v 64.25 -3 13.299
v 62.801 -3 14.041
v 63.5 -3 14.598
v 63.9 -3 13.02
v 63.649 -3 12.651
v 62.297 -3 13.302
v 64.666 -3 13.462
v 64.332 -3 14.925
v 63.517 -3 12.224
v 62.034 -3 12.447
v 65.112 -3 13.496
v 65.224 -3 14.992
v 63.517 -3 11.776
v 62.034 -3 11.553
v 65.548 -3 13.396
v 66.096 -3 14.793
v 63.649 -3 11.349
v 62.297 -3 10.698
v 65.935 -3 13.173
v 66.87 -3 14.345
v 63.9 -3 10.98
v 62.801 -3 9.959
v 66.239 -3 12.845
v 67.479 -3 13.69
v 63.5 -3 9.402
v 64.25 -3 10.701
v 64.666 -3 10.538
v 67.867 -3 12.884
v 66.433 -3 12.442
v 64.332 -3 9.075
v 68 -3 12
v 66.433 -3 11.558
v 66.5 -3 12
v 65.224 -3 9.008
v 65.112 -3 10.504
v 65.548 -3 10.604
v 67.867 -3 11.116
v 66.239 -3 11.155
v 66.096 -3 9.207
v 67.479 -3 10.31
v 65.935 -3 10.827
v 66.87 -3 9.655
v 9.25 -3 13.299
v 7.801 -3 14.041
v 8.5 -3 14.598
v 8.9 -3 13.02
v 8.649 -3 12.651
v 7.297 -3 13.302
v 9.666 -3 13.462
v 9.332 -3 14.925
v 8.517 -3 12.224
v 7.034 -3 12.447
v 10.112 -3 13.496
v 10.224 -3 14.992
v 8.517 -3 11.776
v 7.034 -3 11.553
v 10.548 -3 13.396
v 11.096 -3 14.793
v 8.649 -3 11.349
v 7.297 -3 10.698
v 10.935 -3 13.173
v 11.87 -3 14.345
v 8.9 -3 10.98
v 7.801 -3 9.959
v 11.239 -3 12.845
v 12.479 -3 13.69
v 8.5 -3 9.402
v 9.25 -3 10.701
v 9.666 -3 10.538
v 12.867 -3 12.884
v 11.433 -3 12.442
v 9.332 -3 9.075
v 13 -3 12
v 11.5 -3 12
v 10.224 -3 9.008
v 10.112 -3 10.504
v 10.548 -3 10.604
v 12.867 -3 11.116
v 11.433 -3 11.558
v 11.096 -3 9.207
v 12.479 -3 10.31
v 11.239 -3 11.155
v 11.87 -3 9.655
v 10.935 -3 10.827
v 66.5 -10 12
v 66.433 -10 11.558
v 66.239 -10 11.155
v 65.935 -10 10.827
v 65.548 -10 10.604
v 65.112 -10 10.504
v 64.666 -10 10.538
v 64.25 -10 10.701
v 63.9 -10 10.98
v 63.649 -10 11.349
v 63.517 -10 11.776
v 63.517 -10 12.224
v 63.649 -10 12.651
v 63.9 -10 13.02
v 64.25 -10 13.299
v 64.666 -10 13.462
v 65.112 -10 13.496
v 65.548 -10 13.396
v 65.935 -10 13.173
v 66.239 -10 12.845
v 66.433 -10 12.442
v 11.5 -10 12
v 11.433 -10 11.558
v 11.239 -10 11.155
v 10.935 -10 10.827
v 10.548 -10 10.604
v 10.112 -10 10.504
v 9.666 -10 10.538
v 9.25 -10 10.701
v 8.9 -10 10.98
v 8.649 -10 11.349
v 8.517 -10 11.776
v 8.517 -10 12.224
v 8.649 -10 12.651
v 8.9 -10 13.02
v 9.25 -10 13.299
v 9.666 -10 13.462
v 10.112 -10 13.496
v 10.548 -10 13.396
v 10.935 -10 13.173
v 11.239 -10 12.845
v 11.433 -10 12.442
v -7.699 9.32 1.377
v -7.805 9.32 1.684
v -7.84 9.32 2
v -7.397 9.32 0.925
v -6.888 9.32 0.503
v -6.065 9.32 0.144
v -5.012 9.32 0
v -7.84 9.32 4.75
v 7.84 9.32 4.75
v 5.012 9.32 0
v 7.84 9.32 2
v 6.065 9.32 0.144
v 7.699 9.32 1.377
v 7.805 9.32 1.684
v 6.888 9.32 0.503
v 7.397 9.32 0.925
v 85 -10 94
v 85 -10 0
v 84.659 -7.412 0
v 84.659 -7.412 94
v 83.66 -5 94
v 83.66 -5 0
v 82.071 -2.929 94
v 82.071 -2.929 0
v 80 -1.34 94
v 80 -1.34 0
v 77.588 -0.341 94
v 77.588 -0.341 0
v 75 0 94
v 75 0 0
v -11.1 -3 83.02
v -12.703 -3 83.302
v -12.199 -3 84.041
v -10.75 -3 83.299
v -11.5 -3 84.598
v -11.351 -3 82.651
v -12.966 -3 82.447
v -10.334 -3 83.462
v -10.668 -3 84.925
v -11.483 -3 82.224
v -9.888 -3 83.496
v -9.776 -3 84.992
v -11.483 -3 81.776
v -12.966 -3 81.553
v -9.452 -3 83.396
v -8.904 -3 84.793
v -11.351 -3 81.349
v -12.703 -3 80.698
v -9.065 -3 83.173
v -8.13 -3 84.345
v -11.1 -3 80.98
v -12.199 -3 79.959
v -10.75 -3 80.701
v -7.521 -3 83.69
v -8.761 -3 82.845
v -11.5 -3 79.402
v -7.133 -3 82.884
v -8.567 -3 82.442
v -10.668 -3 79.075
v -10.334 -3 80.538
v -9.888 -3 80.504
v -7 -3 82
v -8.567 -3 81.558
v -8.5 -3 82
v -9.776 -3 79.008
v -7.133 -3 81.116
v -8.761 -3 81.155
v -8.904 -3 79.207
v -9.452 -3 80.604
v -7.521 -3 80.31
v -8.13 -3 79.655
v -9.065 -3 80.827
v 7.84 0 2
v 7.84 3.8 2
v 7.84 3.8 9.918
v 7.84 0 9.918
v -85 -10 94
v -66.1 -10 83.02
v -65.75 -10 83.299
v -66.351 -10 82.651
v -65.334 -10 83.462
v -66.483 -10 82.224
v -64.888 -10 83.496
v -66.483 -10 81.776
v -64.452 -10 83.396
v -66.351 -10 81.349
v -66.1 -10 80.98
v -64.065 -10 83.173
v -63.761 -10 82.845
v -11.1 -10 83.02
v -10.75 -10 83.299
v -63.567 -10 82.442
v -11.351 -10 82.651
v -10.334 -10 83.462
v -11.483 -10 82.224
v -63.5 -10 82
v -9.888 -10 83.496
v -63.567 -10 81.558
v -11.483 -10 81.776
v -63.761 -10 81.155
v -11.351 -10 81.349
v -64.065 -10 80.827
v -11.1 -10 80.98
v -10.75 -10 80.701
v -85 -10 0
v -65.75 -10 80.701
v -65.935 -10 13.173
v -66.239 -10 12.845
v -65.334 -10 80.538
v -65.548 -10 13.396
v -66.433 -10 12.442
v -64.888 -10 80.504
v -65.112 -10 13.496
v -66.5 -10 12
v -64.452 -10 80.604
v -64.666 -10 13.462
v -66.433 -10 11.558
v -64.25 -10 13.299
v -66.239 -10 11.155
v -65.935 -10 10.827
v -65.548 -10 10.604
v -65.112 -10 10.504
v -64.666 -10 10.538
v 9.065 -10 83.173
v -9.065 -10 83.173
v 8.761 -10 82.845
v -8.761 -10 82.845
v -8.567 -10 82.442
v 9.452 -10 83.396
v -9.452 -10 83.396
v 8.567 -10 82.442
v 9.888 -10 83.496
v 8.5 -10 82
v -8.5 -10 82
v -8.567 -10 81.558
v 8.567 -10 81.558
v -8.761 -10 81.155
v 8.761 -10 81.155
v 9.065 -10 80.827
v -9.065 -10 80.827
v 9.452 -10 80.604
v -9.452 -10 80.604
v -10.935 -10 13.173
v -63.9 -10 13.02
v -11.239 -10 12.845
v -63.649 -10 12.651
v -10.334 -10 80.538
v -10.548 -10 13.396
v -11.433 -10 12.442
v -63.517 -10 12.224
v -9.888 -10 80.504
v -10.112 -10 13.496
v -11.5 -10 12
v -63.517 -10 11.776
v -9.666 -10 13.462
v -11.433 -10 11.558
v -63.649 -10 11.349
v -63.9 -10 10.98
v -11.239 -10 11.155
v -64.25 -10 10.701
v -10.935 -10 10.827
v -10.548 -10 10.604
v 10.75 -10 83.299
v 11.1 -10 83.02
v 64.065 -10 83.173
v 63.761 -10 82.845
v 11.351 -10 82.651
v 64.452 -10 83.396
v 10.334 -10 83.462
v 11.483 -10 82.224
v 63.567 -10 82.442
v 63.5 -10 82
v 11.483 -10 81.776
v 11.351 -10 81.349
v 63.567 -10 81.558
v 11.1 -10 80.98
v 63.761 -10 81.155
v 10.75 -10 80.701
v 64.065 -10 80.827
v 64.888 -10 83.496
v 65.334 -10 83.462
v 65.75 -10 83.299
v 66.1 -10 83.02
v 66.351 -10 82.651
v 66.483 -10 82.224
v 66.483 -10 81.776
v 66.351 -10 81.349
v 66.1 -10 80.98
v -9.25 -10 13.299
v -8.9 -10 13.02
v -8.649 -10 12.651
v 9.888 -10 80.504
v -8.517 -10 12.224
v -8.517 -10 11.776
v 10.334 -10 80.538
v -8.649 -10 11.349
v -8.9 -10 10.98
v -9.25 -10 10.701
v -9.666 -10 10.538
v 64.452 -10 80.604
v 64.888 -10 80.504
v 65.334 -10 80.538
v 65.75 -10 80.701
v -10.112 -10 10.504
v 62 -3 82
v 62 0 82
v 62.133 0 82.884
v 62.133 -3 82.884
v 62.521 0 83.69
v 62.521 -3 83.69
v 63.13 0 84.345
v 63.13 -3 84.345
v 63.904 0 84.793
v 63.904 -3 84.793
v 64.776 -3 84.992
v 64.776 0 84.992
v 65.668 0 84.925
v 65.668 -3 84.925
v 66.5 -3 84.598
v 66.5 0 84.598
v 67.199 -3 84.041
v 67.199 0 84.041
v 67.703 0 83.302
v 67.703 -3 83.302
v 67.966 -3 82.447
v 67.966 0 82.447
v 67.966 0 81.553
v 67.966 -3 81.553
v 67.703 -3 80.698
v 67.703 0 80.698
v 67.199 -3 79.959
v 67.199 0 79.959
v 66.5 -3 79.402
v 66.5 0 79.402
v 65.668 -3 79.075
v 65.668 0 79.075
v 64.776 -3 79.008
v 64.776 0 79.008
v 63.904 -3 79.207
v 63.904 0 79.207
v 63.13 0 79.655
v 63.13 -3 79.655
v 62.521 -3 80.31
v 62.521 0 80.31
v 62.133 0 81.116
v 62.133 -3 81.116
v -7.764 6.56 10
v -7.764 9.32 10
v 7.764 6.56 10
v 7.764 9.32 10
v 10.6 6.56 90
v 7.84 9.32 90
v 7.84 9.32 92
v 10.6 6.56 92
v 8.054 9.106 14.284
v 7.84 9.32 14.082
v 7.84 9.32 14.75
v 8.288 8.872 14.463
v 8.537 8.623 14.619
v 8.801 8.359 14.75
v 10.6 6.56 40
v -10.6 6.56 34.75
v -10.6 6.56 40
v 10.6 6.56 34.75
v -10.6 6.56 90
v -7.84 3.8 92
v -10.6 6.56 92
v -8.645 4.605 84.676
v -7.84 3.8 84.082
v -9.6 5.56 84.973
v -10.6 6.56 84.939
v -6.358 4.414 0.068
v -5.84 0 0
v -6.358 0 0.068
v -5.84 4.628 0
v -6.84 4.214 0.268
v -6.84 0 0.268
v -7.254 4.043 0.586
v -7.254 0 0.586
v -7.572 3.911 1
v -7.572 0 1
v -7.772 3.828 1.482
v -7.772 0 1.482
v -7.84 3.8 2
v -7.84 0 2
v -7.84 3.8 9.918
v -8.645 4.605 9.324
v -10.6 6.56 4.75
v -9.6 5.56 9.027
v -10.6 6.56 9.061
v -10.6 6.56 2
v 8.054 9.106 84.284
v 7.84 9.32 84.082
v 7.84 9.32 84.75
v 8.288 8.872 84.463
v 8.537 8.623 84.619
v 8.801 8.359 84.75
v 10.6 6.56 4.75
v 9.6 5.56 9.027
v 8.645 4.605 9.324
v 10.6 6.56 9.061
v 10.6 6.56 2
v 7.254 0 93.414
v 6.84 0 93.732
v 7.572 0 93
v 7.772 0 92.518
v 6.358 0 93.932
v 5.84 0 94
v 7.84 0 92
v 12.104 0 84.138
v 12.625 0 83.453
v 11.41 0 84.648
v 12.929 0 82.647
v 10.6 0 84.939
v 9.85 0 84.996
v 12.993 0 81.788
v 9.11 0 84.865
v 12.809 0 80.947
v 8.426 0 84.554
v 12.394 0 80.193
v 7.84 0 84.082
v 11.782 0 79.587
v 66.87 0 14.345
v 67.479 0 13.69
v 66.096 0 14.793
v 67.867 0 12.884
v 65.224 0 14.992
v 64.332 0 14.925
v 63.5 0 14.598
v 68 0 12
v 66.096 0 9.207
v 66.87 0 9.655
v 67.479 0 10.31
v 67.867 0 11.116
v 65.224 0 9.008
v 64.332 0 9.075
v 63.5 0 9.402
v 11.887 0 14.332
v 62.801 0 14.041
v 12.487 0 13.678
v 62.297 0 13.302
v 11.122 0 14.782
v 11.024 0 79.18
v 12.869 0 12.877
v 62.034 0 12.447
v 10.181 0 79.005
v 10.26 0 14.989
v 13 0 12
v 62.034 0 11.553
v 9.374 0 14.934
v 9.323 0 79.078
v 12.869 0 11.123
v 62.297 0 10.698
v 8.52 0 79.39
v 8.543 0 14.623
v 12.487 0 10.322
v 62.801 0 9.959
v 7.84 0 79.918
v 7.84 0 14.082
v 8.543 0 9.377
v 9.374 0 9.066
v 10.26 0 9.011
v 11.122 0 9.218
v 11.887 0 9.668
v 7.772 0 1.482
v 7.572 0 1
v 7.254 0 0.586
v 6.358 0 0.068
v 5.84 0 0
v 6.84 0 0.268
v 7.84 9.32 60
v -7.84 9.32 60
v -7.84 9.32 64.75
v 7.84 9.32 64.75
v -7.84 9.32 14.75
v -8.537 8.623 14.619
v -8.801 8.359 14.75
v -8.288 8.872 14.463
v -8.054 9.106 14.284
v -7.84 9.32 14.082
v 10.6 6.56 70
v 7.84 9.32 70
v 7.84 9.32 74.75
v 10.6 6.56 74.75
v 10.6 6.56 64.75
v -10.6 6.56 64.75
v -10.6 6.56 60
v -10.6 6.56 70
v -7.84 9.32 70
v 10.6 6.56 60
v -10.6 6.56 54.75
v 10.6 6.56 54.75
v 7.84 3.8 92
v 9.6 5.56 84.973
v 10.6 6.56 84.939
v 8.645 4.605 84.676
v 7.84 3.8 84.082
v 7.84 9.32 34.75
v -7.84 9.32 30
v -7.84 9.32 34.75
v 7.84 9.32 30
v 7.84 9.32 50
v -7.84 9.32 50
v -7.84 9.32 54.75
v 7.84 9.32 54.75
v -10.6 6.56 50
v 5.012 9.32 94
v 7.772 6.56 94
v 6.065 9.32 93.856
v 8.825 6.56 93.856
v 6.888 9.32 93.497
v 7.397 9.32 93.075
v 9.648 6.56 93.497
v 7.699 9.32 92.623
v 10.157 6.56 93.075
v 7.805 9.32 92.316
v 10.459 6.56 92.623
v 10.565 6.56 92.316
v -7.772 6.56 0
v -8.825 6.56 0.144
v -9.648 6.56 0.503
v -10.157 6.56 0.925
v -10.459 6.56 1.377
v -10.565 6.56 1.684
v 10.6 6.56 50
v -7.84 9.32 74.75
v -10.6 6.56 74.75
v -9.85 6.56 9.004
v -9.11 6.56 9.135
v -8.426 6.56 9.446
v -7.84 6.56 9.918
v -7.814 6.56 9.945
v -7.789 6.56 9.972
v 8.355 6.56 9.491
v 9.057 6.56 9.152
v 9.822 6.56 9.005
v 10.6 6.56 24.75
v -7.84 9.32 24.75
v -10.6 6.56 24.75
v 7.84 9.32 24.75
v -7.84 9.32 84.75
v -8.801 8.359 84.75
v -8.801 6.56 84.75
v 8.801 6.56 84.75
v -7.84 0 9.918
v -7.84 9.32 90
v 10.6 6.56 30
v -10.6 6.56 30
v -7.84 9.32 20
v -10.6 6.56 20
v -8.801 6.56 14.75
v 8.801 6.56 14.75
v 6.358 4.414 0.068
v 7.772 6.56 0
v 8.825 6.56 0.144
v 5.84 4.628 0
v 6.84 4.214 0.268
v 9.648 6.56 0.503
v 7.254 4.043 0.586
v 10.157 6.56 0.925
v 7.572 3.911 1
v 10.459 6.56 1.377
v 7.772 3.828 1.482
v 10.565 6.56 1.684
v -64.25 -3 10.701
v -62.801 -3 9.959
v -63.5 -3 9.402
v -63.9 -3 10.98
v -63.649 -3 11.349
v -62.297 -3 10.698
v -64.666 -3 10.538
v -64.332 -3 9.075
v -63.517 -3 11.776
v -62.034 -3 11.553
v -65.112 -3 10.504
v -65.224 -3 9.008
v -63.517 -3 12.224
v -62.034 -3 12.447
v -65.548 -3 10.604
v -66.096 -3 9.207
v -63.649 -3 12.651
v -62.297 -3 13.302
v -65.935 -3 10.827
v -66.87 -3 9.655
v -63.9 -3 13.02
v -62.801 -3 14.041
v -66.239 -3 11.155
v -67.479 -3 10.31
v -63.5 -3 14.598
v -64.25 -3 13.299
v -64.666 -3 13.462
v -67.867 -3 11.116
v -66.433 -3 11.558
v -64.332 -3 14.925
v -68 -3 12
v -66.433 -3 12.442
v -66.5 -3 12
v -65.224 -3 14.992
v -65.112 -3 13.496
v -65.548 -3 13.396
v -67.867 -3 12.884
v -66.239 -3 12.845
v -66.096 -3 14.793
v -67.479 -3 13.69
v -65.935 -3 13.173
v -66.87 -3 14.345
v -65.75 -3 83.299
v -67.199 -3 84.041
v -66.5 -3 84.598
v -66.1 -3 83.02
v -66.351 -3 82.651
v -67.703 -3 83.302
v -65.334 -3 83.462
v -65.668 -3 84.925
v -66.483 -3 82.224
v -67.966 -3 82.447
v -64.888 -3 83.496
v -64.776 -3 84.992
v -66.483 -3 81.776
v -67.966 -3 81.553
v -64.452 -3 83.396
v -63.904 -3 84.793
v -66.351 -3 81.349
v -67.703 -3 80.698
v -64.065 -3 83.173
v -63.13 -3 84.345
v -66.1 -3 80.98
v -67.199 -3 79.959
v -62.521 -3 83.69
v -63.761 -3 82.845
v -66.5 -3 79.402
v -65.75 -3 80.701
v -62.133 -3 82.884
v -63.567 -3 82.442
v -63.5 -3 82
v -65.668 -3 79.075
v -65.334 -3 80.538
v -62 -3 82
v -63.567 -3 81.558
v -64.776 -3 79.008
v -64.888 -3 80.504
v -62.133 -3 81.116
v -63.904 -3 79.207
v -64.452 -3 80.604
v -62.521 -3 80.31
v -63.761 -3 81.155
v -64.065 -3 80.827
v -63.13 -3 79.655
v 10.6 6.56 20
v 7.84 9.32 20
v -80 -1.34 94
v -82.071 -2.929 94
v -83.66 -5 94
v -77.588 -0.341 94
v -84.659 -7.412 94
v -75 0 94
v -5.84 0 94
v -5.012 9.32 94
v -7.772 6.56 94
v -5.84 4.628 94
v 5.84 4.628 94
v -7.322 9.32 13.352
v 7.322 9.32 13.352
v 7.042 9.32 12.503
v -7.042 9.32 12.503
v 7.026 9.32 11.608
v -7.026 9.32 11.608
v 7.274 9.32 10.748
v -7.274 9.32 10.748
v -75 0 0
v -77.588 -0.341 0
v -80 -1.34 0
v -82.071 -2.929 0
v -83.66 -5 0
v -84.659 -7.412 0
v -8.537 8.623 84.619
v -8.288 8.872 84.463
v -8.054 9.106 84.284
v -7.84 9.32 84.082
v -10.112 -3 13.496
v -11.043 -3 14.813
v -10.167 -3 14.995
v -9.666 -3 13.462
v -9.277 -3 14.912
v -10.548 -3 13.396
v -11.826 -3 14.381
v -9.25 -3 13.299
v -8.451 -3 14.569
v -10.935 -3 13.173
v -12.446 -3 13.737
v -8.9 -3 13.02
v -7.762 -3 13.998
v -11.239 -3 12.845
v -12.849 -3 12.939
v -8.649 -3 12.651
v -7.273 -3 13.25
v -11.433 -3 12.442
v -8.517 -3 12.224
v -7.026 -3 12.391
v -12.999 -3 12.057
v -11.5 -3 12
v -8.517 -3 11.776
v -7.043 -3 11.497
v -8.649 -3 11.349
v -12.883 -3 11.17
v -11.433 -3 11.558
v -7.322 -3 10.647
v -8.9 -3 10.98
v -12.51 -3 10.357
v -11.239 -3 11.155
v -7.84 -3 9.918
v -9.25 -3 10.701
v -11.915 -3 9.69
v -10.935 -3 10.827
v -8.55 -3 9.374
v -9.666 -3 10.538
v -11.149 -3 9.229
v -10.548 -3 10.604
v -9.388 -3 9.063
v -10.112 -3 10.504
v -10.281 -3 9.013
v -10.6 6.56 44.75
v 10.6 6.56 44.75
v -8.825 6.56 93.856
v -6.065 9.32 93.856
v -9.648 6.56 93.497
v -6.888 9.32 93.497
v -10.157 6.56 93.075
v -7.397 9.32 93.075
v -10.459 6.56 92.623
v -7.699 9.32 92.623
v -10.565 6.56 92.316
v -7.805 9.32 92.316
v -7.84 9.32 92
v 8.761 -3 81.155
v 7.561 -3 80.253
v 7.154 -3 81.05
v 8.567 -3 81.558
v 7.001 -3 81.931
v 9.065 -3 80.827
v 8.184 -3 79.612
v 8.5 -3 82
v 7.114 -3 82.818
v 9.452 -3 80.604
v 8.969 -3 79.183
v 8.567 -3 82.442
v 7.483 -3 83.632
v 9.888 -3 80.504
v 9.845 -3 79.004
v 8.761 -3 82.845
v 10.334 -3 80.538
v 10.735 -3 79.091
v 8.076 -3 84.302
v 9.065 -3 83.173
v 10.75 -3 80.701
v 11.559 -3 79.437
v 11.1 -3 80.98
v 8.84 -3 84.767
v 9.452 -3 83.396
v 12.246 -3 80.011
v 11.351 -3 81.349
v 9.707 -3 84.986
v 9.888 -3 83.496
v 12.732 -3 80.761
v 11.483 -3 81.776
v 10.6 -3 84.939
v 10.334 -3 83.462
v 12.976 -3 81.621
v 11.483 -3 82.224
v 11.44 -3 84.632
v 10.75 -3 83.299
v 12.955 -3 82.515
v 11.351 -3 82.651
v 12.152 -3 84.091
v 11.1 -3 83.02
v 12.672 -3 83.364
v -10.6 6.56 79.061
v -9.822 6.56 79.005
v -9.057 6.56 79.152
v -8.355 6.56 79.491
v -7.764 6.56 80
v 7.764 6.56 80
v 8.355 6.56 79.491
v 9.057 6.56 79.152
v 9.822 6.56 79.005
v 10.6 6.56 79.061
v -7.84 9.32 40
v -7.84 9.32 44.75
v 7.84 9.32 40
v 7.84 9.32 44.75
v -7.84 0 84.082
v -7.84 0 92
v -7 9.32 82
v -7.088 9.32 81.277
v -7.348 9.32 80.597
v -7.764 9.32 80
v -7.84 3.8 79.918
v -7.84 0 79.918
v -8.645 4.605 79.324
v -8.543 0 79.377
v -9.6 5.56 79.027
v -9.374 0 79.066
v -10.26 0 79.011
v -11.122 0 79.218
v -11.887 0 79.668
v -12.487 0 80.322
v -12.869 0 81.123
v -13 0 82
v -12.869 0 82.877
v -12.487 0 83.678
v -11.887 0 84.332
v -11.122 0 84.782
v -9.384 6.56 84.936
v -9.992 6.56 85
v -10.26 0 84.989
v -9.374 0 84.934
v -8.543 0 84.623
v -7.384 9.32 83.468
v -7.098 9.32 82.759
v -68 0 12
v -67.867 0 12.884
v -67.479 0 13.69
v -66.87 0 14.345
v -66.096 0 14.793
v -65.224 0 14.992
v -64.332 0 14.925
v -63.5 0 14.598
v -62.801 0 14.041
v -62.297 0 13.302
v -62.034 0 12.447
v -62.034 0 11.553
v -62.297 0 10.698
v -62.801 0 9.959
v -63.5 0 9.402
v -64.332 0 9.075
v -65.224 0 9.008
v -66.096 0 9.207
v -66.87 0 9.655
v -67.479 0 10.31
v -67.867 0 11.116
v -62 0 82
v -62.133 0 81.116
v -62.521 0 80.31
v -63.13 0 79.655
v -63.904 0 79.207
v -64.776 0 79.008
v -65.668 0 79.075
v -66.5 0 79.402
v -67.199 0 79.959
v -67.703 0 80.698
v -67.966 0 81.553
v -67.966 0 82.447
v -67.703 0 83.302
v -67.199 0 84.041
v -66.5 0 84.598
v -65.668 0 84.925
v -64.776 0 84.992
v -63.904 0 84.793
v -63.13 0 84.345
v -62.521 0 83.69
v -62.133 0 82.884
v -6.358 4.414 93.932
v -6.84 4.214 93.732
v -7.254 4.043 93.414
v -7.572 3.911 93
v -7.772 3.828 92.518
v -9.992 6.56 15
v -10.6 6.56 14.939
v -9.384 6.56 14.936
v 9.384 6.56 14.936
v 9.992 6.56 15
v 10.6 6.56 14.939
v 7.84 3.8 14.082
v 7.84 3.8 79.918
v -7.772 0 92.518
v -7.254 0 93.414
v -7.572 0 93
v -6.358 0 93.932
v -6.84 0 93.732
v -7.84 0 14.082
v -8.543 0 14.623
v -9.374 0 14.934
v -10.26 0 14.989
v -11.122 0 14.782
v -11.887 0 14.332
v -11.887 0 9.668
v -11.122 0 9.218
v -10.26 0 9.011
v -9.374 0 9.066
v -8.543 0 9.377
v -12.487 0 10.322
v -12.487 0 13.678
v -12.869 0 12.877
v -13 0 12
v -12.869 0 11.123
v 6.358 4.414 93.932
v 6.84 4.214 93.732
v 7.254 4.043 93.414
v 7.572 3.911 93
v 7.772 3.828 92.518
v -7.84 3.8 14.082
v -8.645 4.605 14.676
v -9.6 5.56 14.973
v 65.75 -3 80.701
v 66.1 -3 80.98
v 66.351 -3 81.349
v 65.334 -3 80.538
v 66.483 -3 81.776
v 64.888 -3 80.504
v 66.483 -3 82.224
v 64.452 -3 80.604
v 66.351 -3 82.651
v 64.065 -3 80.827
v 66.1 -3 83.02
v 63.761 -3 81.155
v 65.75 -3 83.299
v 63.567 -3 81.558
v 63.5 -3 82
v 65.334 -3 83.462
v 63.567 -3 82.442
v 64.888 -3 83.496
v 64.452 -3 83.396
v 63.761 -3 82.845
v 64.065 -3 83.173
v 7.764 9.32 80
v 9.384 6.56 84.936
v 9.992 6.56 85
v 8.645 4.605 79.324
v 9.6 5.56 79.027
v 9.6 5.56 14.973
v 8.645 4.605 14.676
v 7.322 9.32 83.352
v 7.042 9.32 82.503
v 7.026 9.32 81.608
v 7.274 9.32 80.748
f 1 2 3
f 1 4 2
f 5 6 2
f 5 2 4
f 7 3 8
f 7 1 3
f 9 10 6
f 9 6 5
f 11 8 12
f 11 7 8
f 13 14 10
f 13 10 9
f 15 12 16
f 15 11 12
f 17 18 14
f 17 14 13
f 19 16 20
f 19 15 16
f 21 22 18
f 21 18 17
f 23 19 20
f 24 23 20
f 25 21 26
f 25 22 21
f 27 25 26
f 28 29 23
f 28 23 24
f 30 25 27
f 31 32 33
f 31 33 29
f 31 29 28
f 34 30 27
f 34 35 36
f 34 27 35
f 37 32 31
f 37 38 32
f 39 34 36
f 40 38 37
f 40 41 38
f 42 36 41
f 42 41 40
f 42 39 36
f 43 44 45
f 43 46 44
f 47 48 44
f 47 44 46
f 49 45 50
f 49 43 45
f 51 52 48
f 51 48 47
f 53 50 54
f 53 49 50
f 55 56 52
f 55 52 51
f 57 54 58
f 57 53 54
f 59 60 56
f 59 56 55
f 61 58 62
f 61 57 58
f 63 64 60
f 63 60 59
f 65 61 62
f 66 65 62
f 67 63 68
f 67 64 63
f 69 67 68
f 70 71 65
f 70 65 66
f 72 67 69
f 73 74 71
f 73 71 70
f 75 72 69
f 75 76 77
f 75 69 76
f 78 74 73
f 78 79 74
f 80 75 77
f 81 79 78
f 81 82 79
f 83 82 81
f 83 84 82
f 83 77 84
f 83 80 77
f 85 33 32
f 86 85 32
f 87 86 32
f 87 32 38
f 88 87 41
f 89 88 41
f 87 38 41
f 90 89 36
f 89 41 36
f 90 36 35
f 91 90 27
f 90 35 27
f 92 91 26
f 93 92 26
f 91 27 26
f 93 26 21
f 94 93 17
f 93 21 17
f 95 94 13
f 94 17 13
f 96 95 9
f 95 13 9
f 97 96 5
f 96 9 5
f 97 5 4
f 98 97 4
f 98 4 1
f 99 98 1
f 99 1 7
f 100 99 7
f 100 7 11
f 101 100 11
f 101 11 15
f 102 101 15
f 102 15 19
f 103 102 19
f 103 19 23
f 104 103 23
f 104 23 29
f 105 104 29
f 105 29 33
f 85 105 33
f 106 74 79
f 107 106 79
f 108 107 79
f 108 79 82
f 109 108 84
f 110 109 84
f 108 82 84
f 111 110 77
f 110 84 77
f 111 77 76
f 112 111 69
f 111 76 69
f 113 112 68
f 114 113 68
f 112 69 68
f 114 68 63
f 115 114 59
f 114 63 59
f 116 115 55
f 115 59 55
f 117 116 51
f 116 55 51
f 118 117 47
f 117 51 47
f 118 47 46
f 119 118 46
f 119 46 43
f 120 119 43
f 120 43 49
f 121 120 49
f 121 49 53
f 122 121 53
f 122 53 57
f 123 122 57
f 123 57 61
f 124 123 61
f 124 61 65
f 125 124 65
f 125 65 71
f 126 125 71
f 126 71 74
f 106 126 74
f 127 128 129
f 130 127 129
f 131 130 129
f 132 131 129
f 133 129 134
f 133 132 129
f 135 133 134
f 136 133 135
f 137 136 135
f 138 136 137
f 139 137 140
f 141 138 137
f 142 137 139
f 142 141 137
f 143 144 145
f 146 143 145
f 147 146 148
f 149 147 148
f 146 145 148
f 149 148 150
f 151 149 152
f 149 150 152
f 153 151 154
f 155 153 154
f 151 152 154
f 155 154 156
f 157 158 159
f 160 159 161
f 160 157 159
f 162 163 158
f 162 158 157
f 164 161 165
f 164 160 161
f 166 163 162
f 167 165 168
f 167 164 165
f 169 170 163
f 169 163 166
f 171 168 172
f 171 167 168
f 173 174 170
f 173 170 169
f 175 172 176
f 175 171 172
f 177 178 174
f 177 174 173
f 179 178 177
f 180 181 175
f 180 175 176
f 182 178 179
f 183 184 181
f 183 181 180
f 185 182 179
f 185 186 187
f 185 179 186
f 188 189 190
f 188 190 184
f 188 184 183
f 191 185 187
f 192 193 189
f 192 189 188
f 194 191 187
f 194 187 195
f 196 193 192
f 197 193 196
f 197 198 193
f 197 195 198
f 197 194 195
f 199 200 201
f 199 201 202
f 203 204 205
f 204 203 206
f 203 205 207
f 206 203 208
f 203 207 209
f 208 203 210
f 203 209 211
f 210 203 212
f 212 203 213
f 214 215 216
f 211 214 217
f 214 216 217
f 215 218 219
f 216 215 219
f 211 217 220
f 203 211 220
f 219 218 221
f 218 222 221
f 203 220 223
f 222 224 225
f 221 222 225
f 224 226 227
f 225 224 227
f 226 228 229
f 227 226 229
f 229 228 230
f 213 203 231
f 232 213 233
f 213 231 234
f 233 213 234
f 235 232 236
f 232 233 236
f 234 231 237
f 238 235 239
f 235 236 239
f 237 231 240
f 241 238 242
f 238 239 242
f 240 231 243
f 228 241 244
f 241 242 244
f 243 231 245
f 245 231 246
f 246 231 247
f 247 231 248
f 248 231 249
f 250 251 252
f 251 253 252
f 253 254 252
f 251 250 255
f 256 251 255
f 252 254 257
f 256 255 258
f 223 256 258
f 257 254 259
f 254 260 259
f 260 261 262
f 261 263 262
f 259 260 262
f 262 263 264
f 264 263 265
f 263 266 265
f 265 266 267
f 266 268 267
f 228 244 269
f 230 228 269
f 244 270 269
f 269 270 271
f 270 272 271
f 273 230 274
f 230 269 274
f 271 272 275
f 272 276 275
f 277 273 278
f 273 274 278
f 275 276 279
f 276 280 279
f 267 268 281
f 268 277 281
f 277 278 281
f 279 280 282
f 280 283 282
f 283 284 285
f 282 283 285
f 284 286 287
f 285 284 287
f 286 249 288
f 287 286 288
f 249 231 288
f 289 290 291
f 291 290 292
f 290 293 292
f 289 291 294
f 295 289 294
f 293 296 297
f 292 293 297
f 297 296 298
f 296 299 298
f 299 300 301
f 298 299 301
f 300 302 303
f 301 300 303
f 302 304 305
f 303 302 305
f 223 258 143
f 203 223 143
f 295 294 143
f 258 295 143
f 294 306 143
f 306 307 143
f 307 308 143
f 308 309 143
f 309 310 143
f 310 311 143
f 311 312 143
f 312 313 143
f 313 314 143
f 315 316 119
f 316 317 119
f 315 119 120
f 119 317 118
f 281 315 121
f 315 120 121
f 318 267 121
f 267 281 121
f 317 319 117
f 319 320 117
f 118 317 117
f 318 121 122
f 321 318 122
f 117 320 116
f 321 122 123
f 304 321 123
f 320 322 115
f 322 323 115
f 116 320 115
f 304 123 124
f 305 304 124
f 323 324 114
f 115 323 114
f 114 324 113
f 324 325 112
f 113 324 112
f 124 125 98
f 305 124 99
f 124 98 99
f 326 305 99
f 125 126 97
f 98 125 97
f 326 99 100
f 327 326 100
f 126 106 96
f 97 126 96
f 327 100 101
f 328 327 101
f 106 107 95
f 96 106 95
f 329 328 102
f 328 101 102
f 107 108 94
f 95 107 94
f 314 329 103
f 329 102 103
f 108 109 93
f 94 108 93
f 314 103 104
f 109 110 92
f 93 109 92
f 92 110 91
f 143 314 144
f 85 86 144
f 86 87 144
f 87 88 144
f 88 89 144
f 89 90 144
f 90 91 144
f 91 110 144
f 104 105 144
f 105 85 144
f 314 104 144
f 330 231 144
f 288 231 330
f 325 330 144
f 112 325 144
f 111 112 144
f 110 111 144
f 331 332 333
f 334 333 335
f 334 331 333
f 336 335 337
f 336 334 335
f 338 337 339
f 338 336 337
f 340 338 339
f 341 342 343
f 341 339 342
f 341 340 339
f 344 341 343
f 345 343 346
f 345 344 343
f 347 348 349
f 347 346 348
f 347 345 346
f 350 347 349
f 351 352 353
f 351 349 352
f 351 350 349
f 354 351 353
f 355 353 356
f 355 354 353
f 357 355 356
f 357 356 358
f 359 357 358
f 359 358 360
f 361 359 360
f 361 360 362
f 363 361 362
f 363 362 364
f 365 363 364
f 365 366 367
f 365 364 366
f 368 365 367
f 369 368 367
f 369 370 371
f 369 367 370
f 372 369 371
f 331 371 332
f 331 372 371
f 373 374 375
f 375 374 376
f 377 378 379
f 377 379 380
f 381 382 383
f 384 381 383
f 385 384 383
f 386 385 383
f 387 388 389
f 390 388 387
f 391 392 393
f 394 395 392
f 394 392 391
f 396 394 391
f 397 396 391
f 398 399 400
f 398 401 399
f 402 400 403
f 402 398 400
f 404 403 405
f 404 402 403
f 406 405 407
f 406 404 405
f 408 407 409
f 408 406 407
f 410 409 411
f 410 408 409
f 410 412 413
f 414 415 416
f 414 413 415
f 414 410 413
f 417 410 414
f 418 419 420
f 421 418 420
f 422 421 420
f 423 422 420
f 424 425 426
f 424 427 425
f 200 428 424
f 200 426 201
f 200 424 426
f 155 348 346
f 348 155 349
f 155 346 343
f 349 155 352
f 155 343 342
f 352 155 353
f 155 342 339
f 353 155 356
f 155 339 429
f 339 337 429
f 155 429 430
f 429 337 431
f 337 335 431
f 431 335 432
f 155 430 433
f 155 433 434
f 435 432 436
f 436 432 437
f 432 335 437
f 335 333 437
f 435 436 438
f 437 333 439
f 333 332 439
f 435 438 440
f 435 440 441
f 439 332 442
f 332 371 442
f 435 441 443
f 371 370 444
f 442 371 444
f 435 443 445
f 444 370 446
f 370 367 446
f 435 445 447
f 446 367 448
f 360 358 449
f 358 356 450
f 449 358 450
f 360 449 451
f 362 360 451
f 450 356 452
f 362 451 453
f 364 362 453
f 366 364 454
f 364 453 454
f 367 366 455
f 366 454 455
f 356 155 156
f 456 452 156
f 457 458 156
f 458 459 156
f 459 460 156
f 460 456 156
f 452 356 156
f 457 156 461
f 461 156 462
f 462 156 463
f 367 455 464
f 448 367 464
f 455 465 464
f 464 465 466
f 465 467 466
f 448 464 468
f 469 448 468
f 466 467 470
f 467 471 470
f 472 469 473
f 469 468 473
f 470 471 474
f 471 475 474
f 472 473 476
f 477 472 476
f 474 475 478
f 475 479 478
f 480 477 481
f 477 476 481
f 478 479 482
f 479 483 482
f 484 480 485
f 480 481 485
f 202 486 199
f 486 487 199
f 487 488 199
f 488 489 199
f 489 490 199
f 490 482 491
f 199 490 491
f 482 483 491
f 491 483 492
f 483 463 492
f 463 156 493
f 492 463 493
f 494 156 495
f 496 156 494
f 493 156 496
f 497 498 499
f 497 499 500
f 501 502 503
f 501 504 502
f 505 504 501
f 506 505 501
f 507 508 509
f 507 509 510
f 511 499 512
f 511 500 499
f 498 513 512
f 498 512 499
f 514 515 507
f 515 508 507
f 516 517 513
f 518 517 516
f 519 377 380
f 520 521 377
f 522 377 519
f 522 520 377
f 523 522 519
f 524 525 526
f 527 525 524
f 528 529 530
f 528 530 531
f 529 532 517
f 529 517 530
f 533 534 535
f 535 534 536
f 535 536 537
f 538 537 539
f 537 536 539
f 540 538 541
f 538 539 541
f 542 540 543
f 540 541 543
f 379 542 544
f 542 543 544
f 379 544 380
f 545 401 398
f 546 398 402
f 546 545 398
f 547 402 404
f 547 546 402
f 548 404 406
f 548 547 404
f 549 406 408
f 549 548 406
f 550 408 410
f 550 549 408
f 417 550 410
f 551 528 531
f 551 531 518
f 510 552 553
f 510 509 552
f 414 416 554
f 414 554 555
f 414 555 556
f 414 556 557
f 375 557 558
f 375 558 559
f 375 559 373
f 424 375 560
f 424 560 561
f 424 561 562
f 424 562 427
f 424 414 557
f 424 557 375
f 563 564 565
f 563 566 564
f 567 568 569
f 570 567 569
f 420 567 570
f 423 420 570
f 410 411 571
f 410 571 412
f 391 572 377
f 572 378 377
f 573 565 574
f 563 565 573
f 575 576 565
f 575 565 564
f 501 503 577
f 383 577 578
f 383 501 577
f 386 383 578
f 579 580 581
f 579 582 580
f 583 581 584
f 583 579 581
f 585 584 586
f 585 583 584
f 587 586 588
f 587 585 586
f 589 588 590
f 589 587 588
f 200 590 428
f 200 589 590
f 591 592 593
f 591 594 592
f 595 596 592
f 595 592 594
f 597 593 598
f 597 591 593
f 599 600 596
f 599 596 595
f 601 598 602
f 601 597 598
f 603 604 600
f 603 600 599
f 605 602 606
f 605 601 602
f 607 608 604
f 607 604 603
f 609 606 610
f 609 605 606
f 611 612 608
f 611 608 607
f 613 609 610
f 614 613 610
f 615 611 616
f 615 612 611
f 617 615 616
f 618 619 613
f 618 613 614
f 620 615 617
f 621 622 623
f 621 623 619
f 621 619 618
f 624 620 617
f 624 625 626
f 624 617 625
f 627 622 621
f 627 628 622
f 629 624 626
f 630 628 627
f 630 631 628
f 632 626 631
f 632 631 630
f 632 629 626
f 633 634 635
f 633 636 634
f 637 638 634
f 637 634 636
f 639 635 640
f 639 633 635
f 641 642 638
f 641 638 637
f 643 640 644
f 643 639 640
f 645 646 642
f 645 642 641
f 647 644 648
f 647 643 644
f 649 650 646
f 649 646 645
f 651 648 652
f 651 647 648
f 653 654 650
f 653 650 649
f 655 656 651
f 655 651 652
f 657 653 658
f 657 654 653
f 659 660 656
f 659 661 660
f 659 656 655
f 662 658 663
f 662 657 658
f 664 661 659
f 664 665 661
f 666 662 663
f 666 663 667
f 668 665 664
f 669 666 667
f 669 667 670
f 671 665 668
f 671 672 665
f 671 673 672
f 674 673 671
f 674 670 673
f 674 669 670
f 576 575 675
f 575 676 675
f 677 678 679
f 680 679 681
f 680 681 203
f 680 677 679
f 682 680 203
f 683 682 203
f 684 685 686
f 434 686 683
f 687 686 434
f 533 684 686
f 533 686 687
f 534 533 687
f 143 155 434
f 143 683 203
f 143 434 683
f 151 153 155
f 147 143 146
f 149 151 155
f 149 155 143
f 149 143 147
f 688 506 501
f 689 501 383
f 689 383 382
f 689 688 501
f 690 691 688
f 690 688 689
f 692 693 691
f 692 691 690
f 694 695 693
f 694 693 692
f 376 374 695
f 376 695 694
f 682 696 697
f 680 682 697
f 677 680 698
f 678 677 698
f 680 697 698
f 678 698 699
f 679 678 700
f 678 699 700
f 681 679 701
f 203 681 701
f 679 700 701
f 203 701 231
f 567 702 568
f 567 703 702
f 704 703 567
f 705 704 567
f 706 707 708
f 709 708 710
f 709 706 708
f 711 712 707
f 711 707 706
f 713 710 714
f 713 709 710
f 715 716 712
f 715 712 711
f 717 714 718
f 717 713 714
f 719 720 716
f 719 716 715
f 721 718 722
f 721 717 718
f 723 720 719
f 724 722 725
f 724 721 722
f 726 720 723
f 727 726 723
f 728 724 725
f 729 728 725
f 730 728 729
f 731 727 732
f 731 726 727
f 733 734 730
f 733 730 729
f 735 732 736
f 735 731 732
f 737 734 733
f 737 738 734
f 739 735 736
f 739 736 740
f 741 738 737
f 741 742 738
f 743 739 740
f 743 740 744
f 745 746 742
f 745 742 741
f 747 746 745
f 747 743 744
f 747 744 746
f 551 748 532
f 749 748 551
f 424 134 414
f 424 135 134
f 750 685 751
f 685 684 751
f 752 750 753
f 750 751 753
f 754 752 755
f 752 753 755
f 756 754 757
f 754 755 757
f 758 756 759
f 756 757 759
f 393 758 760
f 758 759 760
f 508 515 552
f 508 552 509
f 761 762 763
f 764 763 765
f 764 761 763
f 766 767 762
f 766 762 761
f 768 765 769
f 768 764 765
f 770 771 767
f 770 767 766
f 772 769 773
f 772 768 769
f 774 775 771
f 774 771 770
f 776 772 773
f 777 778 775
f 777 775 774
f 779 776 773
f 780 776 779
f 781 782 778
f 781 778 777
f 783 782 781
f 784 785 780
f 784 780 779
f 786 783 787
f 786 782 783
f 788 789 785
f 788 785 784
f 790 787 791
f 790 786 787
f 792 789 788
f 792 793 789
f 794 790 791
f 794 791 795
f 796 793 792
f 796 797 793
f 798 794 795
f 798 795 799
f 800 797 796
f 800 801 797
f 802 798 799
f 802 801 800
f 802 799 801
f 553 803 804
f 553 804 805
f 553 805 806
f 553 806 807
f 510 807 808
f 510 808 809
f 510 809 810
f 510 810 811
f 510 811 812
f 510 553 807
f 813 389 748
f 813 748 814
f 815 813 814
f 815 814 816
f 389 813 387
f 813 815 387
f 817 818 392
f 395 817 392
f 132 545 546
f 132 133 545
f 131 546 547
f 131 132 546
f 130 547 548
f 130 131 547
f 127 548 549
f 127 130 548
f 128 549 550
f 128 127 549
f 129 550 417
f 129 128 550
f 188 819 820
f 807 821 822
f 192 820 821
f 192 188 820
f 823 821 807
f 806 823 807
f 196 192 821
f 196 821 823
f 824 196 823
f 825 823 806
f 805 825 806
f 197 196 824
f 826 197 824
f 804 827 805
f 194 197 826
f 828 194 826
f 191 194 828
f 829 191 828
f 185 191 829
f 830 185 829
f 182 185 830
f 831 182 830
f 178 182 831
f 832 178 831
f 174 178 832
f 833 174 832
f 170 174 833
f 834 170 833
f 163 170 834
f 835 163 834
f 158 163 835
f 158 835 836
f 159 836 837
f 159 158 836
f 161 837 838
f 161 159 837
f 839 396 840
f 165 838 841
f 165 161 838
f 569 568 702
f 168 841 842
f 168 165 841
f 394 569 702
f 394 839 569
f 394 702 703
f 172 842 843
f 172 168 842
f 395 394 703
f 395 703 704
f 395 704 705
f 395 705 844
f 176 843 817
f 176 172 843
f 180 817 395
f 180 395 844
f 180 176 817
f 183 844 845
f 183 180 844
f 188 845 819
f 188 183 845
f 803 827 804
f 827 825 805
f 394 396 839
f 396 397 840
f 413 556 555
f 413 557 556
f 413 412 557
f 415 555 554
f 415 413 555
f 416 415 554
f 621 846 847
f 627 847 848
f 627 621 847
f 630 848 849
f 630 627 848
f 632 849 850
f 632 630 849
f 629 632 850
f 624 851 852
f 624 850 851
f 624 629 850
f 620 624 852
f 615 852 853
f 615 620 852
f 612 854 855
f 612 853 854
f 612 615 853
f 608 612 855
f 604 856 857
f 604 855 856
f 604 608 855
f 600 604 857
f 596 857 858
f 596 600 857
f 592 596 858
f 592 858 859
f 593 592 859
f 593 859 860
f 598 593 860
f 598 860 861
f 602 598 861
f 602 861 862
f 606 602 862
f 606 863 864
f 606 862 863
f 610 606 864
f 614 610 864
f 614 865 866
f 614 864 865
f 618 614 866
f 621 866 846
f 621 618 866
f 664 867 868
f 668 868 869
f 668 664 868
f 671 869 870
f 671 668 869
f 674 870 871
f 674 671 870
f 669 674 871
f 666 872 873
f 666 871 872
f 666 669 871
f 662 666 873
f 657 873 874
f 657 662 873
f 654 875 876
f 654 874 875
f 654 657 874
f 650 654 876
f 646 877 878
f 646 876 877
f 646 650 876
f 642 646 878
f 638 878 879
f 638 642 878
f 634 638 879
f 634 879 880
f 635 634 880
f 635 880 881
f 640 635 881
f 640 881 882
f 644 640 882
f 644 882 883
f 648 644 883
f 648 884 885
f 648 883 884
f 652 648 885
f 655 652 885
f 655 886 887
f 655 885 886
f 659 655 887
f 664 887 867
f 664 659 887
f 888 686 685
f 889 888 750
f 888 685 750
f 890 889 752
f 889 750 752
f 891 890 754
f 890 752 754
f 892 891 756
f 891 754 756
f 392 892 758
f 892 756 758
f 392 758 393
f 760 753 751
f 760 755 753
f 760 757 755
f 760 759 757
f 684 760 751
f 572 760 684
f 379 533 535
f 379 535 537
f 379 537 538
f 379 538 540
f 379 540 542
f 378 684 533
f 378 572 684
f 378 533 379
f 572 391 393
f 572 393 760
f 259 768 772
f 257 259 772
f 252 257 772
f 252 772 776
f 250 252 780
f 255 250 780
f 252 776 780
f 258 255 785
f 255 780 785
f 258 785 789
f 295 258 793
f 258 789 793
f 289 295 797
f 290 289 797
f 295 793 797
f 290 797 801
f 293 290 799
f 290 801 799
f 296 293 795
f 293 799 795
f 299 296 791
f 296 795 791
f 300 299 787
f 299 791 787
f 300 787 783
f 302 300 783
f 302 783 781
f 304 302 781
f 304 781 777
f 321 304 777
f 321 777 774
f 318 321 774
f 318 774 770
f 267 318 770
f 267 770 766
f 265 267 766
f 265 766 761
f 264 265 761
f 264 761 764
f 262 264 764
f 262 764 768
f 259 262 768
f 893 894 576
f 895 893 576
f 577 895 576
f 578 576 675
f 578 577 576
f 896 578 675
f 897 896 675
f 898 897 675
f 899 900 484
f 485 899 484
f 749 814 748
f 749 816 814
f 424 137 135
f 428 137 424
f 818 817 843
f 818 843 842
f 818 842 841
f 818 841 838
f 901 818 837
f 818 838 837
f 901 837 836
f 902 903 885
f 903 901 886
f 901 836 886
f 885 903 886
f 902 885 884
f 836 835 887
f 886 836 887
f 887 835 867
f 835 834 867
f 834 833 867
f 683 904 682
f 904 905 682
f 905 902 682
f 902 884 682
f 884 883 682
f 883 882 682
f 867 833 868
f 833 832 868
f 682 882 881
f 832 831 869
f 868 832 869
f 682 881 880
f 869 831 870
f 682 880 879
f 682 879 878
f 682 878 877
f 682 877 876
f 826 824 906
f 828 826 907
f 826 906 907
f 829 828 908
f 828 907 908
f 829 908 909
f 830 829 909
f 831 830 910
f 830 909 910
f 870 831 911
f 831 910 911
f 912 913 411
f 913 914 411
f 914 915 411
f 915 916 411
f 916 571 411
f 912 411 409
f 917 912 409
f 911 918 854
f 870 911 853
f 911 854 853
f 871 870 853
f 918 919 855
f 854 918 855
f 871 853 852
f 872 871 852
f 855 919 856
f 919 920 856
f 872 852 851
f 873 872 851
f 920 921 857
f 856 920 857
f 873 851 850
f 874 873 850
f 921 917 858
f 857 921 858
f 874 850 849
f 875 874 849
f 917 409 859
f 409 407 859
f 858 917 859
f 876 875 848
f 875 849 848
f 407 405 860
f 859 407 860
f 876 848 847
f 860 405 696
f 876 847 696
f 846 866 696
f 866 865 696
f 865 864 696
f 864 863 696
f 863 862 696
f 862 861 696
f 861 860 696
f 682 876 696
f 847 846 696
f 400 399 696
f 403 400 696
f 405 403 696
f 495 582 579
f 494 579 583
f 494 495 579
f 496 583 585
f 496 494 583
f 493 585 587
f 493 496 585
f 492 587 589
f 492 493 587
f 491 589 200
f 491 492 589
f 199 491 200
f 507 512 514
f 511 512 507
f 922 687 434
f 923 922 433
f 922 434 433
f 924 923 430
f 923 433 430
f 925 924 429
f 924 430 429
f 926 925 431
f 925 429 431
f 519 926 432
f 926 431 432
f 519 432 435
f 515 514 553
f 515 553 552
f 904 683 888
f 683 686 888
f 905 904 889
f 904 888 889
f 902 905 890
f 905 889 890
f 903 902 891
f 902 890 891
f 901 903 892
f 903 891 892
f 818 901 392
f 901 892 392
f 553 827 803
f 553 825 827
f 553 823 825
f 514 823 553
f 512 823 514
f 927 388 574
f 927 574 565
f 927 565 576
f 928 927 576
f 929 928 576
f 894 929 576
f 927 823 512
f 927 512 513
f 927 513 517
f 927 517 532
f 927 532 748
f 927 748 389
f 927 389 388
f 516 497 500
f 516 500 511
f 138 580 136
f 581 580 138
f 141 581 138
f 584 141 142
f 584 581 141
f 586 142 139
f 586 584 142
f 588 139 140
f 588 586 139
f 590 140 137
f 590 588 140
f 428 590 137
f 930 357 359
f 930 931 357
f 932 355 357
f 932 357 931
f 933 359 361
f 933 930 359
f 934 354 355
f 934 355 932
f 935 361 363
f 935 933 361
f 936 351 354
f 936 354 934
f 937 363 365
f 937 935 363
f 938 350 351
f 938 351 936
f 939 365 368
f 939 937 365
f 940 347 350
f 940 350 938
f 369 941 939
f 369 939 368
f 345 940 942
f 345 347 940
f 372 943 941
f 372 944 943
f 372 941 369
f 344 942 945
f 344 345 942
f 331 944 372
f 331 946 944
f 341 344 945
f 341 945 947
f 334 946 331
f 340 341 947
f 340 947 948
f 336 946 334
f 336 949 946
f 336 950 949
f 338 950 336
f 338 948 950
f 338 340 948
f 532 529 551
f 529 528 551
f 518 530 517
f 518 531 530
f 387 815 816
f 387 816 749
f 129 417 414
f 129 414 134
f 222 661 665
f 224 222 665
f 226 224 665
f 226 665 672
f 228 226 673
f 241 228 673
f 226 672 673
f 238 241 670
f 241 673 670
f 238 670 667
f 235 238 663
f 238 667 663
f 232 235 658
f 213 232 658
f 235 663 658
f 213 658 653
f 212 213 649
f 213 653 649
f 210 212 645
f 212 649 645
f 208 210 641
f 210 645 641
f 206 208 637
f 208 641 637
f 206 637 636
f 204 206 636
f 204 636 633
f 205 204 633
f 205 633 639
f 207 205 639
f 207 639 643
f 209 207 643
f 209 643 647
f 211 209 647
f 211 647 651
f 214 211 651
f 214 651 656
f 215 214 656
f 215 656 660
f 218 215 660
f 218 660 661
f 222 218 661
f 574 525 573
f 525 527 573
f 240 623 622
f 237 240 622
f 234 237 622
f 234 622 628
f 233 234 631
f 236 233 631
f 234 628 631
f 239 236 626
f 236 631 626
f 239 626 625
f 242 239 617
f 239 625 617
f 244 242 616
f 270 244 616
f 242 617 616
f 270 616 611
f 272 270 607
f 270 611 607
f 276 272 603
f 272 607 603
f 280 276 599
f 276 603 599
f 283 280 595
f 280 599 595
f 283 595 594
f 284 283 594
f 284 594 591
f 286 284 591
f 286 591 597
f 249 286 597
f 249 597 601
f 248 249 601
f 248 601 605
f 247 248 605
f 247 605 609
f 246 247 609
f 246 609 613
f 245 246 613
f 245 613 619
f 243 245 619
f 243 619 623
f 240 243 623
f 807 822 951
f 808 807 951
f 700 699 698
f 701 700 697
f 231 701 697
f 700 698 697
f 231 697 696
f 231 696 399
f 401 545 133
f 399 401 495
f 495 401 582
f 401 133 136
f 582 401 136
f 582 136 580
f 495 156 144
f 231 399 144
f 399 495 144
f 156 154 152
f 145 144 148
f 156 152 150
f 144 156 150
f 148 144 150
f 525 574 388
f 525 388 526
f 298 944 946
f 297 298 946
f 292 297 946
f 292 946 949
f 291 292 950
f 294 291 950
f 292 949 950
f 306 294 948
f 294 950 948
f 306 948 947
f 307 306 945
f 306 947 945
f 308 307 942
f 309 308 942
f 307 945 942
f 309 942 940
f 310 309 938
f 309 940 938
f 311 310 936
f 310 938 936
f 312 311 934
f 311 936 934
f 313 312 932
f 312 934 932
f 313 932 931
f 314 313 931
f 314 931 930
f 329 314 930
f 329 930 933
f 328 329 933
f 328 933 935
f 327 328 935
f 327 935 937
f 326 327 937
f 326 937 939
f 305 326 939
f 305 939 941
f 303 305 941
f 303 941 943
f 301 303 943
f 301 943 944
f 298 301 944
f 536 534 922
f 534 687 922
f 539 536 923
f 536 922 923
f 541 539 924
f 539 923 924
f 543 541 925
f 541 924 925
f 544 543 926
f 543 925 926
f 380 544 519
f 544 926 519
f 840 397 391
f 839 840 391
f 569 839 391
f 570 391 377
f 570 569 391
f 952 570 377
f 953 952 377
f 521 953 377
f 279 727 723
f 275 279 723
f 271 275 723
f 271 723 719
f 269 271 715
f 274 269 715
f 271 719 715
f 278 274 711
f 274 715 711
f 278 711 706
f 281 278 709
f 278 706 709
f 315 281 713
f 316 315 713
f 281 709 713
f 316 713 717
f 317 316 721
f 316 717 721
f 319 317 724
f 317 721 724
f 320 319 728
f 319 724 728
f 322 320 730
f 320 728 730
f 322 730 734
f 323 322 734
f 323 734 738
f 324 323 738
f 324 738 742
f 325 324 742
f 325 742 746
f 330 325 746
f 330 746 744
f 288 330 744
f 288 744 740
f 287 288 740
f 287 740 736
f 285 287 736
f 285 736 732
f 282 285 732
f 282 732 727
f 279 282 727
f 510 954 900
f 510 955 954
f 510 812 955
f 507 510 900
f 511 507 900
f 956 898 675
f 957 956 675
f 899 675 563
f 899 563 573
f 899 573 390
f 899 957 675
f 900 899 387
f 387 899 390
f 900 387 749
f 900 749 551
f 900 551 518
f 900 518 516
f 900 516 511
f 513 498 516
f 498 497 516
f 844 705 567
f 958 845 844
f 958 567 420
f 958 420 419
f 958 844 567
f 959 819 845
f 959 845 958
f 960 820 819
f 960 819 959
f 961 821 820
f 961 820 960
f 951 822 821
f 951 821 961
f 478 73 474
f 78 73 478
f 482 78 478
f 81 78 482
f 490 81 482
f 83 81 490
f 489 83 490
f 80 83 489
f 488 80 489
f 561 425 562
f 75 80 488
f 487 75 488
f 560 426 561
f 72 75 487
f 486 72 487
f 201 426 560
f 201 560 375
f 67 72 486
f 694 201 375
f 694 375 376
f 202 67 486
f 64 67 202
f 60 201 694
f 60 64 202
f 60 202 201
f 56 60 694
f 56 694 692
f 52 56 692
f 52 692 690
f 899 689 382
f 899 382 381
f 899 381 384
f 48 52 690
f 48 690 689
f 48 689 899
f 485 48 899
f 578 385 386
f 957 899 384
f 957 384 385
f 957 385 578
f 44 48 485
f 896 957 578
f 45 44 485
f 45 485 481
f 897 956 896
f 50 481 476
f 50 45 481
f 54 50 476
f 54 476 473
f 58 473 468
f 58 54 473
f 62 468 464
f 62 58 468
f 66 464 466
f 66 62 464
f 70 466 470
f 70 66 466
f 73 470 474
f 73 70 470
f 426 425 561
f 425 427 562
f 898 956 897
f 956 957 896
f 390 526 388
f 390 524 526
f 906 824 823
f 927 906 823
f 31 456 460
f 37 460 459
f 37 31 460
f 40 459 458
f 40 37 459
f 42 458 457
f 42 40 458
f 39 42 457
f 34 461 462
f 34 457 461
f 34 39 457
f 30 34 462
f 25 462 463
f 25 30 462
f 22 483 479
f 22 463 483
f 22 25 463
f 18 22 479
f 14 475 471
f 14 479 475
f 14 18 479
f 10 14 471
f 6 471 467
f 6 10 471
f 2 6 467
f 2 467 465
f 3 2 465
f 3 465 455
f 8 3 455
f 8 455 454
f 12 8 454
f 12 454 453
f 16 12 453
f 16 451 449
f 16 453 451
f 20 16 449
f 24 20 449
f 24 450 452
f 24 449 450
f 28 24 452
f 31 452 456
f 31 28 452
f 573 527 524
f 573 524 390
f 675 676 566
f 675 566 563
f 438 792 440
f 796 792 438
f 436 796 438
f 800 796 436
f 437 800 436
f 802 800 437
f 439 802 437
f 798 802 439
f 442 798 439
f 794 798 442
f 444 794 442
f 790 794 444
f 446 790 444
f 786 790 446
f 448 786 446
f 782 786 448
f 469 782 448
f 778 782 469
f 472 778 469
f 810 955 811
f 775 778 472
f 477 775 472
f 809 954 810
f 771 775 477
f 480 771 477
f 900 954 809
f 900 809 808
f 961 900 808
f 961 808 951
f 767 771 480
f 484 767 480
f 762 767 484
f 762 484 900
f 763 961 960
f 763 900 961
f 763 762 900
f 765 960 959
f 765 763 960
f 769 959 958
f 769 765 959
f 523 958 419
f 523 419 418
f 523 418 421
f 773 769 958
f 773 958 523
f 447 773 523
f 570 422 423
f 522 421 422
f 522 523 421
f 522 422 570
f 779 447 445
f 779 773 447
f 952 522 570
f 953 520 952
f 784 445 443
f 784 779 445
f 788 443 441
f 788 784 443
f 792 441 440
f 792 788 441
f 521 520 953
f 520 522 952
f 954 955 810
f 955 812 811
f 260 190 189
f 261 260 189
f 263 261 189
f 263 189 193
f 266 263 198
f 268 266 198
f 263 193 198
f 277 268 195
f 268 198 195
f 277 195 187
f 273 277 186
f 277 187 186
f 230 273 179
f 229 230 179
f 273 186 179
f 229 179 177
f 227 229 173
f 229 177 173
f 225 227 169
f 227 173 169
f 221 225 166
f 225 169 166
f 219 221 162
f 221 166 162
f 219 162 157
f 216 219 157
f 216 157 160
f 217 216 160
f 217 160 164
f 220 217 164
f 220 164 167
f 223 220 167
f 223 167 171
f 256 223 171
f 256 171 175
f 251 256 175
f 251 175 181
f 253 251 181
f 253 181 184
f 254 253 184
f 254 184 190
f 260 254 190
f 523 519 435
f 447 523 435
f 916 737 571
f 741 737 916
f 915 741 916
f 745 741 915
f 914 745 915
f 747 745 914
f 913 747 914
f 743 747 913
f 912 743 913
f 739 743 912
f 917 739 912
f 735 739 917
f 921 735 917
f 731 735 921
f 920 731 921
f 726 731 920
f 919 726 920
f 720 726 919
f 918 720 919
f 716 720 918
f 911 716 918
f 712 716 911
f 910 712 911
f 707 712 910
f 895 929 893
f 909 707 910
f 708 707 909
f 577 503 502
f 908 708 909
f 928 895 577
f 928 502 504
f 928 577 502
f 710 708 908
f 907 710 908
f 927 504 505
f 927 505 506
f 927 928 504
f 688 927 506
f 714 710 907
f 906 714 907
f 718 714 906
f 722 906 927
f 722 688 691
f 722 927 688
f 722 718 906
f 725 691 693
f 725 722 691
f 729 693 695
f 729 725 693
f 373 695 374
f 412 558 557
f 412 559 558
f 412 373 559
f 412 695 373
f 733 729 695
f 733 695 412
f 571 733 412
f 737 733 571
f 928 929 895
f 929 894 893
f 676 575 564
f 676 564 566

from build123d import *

# Parameters (mm, degrees)
EXTRUDE_1_DEPTH        = 94
EXTRUDE_2_DEPTH        = 94
SKETCH_4_R             = 1.5
CUT_EXTRUDE_1_DEPTH    = 128.125921826
CUT_EXTRUDE_START      = -3
SKETCH_5_R             = 3
CUT_EXTRUDE_2_DEPTH    = 131.125921826
SKETCH_6_W             = 21.2
SKETCH_6_H             = 5.25
CUT_EXTRUDE_3_DEPTH    = 2.76
PATTERN_LINEAR_1_COUNT = 9
PATTERN_LINEAR_1_PITCH = 10
FILLET_2_R             = 2


with BuildPart() as part:
    # 草图3 → 凸台-拉伸1 (new body)
    with BuildSketch(Plane.XY):
        with BuildLine():
            Line((0, 0), (-75, 0))
            ThreePointArc((-75, 0), (-82.071067812, -2.928932188), (-85, -10))
            Line((-85, -10), (-75, -10))
            Line((-75, -10), (0, -10))
            Line((0, -10), (0, 0))
        make_face()
        with BuildLine():
            Line((75, 0), (0, 0))
            Line((0, 0), (0, -10))
            Line((0, -10), (75, -10))
            Line((75, -10), (85, -10))
            ThreePointArc((85, -10), (82.071067812, -2.928932188), (75, 0))
        make_face()
    extrude(amount=EXTRUDE_1_DEPTH)

    # 草图2 → 凸台-拉伸2 (add, through all)
    with BuildSketch(Plane.XY):
        Polygon((7.84, 9.32), (10.6, 6.56), (7.84, 3.8), (7.84, 0), (-7.84, 0), (-7.84, 3.8), (-10.6, 6.56), (-7.84, 9.32), align=None)
    extrude(amount=EXTRUDE_2_DEPTH)

    # 草图4 → 切除-拉伸1 (cut, through all)
    with BuildSketch(Plane(origin=(0, 0, 0), x_dir=(1, 0, 0), z_dir=(0, 1, 0))):
        with Locations(Location((-65, -12, 0), (0, 0, 180))):
            Circle(SKETCH_4_R)
        with Locations(Location((-10, -12, 0), (0, 0, 180))):
            Circle(SKETCH_4_R)
        with Locations((10, -12)):
            Circle(SKETCH_4_R)
        with Locations((65, -12)):
            Circle(SKETCH_4_R)
        with Locations(Location((65, -82, 0), (0, 0, 180))):
            Circle(SKETCH_4_R)
        with Locations(Location((10, -82, 0), (0, 0, 180))):
            Circle(SKETCH_4_R)
        with Locations((-65, -82)):
            Circle(SKETCH_4_R)
        with Locations((-10, -82)):
            Circle(SKETCH_4_R)
    extrude(amount=-CUT_EXTRUDE_1_DEPTH, mode=Mode.SUBTRACT)

    # 草图5 → 切除-拉伸2 (cut, through all)
    with BuildSketch(Plane(origin=(0, 0, 0), x_dir=(1, 0, 0), z_dir=(0, 1, 0)).offset(CUT_EXTRUDE_START)):
        with Locations(Location((-65, -12, 0), (0, 0, 180))):
            Circle(SKETCH_5_R)
        with Locations(Location((-10, -12, 0), (0, 0, 43.945519562))):
            Circle(SKETCH_5_R)
        with Locations((10, -12)):
            Circle(SKETCH_5_R)
        with Locations((65, -12)):
            Circle(SKETCH_5_R)
        with Locations(Location((65, -82, 0), (0, 0, 180))):
            Circle(SKETCH_5_R)
        with Locations(Location((10, -82, 0), (0, 0, 281.536959033))):
            Circle(SKETCH_5_R)
        with Locations((-10, -82)):
            Circle(SKETCH_5_R)
        with Locations((-65, -82)):
            Circle(SKETCH_5_R)
    extrude(amount=CUT_EXTRUDE_2_DEPTH, mode=Mode.SUBTRACT)

    # 草图6 → 切除-拉伸3 (cut)
    with BuildSketch(Plane(origin=(0, 9.32, 0), x_dir=(1, 0, 0), z_dir=(0, 1, 0))):
        with Locations((0, -7.375)):
            Rectangle(SKETCH_6_W, SKETCH_6_H)
    cut_extrude_3 = extrude(amount=-CUT_EXTRUDE_3_DEPTH, mode=Mode.SUBTRACT)

    # 阵列(线性)1: 切除-拉伸3 ×9
    with Locations(*[(0, 0, i * PATTERN_LINEAR_1_PITCH) for i in range(1, PATTERN_LINEAR_1_COUNT)]):
        add(cut_extrude_3, mode=Mode.SUBTRACT)

    # 圆角2
    fillet_2_edges = [part.edges().sort_by_distance(p)[0] for p in [
        (-9.22, 7.94, 0),
        (-9.22, 5.18, 0),
        (-7.84, 1.9, 0),
        (7.84, 1.9, 0),
        (9.22, 5.18, 0),
        (9.22, 7.94, 0),
        (-9.22, 7.94, 94),
        (-9.22, 5.18, 94),
        (-7.84, 1.9, 94),
        (7.84, 1.9, 94),
        (9.22, 5.18, 94),
        (9.22, 7.94, 94),
    ]]
    fillet(fillet_2_edges, radius=FILLET_2_R)


solid = part.part
